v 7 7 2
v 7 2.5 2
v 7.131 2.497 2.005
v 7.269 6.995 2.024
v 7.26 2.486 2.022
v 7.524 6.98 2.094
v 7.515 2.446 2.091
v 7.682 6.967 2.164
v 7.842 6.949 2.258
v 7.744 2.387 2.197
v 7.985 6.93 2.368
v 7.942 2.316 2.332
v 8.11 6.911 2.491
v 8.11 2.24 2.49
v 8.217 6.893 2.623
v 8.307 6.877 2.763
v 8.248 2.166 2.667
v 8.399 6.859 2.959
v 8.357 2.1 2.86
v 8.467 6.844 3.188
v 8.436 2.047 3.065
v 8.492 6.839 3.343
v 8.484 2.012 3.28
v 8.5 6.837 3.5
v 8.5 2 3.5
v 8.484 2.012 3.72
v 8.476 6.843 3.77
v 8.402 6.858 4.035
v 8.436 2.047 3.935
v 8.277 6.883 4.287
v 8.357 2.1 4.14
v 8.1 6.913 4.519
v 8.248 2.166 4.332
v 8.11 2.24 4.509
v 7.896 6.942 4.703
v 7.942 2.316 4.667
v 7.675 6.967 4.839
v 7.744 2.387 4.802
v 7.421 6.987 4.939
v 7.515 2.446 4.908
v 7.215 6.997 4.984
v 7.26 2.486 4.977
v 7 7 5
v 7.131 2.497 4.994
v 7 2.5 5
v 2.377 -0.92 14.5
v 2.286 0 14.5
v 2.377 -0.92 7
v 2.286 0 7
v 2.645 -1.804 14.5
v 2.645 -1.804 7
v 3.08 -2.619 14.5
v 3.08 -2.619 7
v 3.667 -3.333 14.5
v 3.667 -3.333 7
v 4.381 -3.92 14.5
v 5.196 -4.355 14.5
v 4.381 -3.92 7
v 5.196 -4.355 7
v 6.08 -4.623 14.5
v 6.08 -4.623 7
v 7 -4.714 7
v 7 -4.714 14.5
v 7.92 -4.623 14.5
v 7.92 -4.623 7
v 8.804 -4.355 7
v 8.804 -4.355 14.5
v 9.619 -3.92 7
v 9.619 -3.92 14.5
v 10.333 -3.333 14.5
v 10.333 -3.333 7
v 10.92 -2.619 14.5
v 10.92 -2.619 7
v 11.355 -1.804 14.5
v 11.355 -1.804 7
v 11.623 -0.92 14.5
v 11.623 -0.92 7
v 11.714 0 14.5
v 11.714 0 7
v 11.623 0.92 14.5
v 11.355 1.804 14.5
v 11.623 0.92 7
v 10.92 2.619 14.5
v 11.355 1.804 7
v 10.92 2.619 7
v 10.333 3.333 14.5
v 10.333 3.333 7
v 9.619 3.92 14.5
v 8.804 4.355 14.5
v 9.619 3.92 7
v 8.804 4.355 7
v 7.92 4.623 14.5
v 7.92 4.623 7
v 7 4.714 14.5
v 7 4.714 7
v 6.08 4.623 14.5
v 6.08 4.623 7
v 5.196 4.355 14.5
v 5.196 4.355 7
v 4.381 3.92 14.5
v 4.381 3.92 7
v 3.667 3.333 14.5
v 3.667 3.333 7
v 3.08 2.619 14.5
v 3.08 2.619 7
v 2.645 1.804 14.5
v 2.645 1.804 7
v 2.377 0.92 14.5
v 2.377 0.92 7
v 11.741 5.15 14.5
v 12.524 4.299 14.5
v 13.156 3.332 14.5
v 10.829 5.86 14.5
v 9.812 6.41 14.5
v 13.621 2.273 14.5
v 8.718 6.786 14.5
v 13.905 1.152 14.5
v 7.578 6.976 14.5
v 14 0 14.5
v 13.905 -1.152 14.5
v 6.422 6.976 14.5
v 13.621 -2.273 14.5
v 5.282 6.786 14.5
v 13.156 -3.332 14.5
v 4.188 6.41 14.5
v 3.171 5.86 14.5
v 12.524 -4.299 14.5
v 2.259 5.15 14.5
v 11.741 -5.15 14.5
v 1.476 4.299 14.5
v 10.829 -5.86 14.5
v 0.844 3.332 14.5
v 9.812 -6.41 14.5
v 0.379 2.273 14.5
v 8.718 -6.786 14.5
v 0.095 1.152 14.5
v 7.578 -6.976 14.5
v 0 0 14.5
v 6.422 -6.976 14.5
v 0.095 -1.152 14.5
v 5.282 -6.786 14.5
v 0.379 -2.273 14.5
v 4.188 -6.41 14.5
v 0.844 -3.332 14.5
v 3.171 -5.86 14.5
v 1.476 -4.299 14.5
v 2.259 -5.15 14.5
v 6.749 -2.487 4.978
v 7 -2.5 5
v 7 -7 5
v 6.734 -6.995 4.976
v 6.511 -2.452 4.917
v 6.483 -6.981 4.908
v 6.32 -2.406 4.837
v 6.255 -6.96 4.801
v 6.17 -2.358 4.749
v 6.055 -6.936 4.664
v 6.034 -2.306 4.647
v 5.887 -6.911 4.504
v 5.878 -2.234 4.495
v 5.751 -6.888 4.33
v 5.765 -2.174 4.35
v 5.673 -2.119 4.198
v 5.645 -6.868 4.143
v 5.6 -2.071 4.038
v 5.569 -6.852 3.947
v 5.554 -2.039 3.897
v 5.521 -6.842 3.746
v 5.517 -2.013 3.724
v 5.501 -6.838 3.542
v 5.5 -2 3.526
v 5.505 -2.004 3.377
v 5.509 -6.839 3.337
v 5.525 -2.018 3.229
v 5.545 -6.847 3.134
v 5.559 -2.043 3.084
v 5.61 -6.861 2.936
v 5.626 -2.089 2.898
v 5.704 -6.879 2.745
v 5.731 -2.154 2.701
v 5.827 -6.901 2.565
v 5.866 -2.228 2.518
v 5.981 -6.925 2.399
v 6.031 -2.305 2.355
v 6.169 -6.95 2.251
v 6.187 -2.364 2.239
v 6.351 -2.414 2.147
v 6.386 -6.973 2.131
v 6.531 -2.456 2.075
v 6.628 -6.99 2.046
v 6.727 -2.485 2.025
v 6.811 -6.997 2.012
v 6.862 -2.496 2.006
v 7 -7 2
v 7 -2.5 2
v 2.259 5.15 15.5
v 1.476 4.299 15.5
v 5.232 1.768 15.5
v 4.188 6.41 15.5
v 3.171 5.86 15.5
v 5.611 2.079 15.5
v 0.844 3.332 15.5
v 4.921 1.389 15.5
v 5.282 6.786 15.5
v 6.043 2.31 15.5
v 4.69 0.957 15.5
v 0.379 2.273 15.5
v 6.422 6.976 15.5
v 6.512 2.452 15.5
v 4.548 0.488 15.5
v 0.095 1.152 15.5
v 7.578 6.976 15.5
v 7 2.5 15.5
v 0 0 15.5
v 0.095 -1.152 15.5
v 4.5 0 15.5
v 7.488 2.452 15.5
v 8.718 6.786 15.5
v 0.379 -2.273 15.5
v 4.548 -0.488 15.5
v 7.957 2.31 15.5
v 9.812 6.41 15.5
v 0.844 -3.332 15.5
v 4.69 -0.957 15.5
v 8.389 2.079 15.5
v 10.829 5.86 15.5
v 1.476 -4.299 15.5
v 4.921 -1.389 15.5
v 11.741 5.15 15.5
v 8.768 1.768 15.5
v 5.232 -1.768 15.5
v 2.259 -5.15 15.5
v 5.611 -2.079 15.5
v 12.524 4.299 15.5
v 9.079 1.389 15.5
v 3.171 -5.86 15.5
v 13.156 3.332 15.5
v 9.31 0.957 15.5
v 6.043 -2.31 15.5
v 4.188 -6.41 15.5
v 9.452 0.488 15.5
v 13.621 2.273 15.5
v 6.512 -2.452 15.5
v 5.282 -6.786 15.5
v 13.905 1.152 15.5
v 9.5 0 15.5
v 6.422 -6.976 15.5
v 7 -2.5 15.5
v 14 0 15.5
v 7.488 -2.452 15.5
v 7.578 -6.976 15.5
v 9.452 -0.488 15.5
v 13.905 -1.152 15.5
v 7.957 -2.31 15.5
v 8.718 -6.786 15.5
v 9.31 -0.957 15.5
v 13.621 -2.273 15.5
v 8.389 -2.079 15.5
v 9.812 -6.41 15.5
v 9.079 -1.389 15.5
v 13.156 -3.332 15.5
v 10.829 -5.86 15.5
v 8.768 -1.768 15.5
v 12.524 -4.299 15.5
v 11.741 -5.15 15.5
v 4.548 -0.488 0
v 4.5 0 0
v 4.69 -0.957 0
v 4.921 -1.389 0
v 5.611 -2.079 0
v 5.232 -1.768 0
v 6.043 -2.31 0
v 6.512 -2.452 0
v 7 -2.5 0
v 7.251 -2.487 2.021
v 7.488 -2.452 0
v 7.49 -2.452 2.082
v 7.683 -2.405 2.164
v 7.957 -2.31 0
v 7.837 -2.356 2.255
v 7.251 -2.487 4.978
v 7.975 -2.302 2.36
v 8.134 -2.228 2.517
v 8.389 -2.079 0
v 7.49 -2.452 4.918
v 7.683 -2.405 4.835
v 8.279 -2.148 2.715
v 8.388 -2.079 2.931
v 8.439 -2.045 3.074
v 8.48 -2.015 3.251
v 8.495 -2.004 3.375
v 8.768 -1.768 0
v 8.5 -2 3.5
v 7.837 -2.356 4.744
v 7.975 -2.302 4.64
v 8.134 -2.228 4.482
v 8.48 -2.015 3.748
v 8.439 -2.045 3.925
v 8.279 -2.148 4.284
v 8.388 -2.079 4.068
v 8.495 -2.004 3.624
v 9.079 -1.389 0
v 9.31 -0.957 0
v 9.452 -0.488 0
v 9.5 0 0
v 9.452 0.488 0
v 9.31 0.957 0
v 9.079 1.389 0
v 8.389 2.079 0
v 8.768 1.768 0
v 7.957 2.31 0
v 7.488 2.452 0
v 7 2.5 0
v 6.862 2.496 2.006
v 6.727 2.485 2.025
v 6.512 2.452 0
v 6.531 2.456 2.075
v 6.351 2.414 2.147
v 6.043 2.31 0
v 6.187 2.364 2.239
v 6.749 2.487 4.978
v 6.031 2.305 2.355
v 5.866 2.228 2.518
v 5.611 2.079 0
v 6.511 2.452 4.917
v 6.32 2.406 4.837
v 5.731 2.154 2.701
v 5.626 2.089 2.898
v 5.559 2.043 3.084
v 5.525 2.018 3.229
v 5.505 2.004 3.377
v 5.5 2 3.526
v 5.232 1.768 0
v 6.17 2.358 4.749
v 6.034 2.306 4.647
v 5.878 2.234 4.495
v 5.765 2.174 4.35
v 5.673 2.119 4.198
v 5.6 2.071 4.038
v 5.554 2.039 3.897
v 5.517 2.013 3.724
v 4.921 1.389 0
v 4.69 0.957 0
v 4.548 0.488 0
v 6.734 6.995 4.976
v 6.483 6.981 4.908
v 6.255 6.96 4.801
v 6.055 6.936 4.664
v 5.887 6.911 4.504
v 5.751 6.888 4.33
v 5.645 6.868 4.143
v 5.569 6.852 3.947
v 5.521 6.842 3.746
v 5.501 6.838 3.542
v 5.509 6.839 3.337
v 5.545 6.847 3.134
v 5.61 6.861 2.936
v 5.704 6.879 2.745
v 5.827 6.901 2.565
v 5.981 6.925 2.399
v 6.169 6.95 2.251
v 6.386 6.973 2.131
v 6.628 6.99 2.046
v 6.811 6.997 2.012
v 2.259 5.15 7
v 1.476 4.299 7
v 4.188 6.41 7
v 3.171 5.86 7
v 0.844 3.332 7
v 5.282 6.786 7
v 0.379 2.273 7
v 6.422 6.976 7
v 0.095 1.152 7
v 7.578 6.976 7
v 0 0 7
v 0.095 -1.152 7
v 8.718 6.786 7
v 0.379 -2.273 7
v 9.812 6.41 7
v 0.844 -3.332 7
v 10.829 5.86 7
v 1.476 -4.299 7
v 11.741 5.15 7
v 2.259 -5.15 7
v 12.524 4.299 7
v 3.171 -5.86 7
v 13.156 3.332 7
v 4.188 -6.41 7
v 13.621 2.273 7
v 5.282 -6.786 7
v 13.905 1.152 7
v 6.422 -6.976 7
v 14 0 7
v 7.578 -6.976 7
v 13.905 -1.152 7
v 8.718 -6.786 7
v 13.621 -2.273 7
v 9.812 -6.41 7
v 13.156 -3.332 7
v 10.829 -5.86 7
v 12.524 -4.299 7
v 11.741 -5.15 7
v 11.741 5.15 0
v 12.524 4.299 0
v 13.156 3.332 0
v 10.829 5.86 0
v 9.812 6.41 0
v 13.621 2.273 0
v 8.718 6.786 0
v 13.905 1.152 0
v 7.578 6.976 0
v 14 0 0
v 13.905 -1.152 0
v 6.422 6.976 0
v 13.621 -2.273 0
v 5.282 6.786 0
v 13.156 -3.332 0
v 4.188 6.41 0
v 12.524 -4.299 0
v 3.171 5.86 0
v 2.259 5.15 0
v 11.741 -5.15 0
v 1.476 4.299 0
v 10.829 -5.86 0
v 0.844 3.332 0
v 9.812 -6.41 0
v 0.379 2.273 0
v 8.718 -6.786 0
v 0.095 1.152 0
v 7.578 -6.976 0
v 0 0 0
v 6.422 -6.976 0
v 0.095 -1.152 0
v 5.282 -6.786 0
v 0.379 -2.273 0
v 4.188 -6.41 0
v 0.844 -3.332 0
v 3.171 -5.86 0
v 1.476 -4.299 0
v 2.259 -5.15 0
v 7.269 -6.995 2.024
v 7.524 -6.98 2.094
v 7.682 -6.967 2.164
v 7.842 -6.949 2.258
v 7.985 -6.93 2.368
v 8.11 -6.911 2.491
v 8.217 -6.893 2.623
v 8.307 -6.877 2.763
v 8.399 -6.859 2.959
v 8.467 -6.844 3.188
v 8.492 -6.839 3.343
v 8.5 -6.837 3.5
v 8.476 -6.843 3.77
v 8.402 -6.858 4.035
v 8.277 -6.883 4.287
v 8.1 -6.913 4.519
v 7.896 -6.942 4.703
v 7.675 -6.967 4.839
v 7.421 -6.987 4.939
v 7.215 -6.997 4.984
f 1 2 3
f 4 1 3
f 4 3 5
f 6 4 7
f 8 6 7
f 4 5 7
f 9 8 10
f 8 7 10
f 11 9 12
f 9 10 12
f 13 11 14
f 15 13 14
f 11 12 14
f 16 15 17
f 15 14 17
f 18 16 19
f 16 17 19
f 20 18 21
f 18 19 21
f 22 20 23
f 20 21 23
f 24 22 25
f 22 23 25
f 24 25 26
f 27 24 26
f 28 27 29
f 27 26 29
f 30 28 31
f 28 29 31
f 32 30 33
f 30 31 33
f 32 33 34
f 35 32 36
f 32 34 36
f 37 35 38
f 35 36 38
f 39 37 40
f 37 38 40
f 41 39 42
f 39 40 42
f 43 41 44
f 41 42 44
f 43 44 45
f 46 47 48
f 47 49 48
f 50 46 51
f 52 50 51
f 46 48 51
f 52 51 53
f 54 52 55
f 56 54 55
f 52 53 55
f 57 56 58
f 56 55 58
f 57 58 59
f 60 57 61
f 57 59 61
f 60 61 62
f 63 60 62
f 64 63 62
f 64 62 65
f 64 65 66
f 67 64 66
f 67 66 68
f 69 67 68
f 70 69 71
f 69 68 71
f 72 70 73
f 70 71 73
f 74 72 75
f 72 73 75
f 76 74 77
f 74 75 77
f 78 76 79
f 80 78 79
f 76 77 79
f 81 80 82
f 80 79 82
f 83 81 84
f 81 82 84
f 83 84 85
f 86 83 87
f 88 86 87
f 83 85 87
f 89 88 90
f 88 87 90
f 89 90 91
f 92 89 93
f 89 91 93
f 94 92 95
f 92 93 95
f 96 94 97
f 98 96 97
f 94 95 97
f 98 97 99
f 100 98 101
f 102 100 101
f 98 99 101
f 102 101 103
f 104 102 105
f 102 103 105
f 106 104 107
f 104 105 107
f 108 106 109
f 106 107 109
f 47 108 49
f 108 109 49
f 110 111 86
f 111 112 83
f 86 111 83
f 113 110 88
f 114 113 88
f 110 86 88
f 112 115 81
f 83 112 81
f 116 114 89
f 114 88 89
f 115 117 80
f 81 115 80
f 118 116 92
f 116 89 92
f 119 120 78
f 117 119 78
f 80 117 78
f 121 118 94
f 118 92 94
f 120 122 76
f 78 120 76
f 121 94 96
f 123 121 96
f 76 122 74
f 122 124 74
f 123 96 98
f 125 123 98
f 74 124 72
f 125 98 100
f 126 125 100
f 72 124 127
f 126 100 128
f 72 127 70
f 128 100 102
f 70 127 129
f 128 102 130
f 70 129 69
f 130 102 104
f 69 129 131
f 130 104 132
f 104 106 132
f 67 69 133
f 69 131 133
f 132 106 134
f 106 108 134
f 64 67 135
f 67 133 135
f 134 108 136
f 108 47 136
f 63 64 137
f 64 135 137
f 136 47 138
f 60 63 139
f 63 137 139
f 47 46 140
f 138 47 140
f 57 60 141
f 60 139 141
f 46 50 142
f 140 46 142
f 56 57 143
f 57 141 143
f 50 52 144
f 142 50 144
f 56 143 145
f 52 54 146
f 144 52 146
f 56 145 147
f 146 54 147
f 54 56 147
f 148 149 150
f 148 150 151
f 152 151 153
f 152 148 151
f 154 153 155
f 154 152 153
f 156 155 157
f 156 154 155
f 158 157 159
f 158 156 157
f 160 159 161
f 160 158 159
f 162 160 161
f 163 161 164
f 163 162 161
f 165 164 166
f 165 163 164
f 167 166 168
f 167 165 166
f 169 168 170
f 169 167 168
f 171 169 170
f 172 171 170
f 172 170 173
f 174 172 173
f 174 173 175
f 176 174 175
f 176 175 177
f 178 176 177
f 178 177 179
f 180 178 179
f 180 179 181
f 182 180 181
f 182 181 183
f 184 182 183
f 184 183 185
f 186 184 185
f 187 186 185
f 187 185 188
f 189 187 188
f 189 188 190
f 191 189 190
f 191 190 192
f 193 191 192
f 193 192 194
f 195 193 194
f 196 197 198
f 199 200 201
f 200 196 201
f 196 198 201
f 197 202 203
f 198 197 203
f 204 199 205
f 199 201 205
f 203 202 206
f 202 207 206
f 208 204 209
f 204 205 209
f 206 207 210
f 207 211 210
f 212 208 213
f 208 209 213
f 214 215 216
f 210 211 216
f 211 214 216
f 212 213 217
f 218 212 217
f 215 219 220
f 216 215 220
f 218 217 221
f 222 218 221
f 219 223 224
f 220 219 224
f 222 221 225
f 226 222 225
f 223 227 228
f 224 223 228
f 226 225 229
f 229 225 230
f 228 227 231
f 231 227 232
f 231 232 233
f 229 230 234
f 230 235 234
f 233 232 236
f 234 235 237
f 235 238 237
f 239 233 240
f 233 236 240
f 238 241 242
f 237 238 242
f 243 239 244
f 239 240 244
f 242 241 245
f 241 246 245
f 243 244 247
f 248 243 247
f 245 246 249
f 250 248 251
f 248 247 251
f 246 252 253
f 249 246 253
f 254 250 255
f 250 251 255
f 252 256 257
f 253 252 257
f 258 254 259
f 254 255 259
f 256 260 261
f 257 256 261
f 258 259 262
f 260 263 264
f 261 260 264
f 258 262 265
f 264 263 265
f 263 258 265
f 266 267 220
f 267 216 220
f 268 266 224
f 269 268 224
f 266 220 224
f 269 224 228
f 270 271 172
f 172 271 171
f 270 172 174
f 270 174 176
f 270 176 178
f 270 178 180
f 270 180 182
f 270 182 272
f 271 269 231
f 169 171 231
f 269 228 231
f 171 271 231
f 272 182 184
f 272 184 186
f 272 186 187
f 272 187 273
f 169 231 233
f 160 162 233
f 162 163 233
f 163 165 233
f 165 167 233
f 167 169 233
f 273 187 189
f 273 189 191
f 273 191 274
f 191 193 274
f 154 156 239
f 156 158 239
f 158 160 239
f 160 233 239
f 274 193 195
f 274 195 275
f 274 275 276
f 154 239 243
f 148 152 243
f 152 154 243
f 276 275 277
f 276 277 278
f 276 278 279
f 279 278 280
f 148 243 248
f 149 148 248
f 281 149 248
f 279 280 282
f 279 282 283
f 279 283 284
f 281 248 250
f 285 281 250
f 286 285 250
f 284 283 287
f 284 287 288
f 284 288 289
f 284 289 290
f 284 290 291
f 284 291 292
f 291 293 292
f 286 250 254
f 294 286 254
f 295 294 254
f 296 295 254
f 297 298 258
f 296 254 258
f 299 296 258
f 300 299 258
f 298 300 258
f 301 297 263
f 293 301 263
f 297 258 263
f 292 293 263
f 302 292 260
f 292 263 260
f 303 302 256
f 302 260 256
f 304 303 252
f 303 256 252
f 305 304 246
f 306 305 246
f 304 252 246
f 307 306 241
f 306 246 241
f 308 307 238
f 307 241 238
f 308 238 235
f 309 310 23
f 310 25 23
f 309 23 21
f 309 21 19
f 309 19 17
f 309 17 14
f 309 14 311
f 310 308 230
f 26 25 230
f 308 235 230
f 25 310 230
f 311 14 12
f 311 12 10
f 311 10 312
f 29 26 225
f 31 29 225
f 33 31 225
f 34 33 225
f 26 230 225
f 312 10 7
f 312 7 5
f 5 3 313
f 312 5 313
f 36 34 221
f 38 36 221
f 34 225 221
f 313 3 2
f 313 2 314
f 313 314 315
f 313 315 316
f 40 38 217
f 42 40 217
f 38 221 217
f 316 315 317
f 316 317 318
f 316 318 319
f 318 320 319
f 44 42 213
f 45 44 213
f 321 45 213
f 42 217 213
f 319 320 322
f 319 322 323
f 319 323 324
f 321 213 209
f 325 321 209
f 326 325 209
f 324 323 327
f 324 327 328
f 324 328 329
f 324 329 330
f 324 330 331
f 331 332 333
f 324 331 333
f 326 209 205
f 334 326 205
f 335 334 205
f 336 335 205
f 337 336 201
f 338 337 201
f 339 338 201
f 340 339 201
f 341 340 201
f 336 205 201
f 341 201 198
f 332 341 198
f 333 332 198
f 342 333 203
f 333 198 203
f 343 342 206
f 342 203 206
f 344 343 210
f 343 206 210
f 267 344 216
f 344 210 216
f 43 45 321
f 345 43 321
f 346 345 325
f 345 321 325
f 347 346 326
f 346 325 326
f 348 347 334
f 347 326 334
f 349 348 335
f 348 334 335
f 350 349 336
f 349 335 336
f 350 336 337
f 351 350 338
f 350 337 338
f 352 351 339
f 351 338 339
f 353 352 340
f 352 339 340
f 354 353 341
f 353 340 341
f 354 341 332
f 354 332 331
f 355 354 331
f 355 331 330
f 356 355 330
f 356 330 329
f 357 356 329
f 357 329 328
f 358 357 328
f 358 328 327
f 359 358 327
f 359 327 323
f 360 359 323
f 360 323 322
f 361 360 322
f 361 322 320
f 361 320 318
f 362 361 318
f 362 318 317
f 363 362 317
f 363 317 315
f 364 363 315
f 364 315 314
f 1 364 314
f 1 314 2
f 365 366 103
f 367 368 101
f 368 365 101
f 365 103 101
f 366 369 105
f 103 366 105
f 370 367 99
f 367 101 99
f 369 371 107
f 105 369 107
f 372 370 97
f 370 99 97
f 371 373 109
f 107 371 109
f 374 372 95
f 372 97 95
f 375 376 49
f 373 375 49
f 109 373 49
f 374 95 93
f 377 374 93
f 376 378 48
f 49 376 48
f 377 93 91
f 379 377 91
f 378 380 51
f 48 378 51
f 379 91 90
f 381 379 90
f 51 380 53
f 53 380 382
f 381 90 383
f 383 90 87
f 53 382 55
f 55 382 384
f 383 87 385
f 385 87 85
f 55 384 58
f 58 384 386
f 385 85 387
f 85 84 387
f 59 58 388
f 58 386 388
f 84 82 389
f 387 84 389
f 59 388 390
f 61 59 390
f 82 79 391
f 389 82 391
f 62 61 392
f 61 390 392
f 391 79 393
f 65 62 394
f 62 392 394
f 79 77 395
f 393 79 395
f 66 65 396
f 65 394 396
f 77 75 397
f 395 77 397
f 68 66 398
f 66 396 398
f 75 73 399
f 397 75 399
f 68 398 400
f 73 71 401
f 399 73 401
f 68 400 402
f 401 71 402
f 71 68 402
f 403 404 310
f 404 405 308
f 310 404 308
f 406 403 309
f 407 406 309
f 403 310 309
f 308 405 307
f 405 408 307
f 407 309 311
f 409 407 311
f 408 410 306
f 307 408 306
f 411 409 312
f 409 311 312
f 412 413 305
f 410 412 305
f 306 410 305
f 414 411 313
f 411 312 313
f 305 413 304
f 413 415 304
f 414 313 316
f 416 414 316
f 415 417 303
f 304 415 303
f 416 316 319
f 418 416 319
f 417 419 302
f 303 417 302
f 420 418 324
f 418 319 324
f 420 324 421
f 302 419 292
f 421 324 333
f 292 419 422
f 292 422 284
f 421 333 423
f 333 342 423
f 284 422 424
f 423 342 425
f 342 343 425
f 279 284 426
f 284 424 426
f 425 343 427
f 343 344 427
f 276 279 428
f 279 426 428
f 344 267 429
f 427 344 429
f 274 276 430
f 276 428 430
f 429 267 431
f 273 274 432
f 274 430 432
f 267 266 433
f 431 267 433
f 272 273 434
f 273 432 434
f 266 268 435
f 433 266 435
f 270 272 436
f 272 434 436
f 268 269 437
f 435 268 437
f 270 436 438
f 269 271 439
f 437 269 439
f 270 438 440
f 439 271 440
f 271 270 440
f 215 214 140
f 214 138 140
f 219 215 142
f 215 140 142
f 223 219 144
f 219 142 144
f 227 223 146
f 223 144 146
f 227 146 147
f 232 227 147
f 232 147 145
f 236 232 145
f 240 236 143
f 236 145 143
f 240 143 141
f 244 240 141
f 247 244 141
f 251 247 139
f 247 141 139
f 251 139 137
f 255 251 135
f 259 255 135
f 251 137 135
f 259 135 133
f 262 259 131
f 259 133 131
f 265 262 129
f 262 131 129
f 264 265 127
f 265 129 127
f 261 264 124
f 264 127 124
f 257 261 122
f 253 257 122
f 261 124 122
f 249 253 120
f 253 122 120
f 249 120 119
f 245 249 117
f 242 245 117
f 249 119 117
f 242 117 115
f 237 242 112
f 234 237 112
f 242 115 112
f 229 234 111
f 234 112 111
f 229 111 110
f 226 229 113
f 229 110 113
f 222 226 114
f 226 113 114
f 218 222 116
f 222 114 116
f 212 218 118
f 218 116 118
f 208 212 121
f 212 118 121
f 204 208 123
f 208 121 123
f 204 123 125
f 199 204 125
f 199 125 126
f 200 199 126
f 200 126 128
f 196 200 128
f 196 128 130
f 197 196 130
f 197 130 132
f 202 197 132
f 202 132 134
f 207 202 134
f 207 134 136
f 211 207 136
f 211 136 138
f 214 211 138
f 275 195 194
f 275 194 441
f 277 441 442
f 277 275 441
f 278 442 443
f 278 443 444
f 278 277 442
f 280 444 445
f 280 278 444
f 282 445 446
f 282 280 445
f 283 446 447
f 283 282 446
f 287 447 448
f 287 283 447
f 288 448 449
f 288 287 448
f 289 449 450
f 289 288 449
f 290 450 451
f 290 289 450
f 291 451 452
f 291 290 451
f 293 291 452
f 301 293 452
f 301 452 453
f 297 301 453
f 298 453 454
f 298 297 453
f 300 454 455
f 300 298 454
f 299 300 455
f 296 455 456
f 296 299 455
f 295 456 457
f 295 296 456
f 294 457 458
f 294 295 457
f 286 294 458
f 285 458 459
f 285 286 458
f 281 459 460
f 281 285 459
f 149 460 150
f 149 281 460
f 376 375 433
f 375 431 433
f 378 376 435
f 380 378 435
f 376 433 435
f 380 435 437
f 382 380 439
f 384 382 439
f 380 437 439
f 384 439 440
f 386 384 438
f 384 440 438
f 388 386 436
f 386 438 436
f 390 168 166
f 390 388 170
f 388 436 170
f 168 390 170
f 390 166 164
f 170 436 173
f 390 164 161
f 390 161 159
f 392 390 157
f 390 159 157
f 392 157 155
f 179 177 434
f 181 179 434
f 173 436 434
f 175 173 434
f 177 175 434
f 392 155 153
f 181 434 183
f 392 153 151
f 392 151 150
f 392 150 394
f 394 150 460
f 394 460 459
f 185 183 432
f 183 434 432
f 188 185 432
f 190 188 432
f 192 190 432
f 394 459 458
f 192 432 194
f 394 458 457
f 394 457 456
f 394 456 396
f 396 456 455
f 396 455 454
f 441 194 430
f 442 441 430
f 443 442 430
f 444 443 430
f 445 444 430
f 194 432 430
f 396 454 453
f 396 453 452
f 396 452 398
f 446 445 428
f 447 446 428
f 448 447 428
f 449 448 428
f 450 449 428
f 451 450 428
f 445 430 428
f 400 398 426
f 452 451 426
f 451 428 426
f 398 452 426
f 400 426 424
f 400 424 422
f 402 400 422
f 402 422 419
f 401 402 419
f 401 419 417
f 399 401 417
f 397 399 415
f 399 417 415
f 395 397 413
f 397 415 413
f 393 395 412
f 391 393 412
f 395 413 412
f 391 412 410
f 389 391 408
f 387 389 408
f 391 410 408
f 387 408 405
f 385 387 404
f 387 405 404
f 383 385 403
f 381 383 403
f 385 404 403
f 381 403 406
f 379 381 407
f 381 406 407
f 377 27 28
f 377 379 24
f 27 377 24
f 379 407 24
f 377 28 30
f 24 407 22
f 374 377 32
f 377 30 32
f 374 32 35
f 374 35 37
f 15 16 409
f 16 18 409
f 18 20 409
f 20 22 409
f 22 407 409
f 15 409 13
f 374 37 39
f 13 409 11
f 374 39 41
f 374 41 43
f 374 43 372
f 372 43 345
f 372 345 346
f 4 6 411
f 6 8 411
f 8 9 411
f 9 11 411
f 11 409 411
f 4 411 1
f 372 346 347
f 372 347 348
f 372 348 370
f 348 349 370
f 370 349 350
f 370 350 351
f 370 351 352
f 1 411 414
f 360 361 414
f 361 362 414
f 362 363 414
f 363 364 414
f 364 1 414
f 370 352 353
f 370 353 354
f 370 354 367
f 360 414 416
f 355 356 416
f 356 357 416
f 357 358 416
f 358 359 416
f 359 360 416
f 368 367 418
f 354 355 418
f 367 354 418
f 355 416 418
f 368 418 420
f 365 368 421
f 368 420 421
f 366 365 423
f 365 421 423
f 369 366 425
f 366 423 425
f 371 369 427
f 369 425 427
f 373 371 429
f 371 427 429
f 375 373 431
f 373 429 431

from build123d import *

# Parameters (mm, degrees)
F3_DEPTH = 7.0009987
F4_DEPTH = 25.4


with BuildPart() as f1:
    # F0 (on Front) → F1 (revolve)
    with BuildSketch(Plane.XZ):
        Polygon((0, 7.0000114), (0, 0), (4.49999862, 0), (4.49999862, 15.49999948), (0, 15.49999948), (0, 14.5000218), (2.286, 14.5000218), (2.286, 7.0000114), align=None)
    revolve(axis=Axis((6.9999987, 0, 7.74999974), (0, 0, 1)))

    # F2 (on Front) → F3 (cut, through all)
    with BuildSketch(Plane.XZ):
        with BuildLine():
            Line((7.00024, 4.9995884903), (7.00024, 1.9995944903))
            ThreePointArc((7.00024, 1.9995944903), (8.0608980505, 2.4389334398), (8.500237, 3.4995914903))
            ThreePointArc((8.500237, 3.4995914903), (8.0608980505, 4.5602495407), (7.00024, 4.9995884903))
        make_face()
        with BuildLine():
            ThreePointArc((7.00024, 4.9995884903), (5.500243, 3.4995914903), (7.00024, 1.9995944903))
            Line((7.00024, 1.9995944903), (7.00024, 4.9995884903))
        make_face()
    extrude(amount=-F3_DEPTH, mode=Mode.SUBTRACT)

    # F2 (on Front) → F4 (cut)
    with BuildSketch(Plane.XZ):
        with BuildLine():
            ThreePointArc((7.00024, 4.9995884903), (5.500243, 3.4995914903), (7.00024, 1.9995944903))
            Line((7.00024, 1.9995944903), (7.00024, 4.9995884903))
        make_face()
        with BuildLine():
            Line((7.00024, 4.9995884903), (7.00024, 1.9995944903))
            ThreePointArc((7.00024, 1.9995944903), (8.0608980505, 2.4389334398), (8.500237, 3.4995914903))
            ThreePointArc((8.500237, 3.4995914903), (8.0608980505, 4.5602495407), (7.00024, 4.9995884903))
        make_face()
    extrude(amount=F4_DEPTH, mode=Mode.SUBTRACT)


solid = f1.part
